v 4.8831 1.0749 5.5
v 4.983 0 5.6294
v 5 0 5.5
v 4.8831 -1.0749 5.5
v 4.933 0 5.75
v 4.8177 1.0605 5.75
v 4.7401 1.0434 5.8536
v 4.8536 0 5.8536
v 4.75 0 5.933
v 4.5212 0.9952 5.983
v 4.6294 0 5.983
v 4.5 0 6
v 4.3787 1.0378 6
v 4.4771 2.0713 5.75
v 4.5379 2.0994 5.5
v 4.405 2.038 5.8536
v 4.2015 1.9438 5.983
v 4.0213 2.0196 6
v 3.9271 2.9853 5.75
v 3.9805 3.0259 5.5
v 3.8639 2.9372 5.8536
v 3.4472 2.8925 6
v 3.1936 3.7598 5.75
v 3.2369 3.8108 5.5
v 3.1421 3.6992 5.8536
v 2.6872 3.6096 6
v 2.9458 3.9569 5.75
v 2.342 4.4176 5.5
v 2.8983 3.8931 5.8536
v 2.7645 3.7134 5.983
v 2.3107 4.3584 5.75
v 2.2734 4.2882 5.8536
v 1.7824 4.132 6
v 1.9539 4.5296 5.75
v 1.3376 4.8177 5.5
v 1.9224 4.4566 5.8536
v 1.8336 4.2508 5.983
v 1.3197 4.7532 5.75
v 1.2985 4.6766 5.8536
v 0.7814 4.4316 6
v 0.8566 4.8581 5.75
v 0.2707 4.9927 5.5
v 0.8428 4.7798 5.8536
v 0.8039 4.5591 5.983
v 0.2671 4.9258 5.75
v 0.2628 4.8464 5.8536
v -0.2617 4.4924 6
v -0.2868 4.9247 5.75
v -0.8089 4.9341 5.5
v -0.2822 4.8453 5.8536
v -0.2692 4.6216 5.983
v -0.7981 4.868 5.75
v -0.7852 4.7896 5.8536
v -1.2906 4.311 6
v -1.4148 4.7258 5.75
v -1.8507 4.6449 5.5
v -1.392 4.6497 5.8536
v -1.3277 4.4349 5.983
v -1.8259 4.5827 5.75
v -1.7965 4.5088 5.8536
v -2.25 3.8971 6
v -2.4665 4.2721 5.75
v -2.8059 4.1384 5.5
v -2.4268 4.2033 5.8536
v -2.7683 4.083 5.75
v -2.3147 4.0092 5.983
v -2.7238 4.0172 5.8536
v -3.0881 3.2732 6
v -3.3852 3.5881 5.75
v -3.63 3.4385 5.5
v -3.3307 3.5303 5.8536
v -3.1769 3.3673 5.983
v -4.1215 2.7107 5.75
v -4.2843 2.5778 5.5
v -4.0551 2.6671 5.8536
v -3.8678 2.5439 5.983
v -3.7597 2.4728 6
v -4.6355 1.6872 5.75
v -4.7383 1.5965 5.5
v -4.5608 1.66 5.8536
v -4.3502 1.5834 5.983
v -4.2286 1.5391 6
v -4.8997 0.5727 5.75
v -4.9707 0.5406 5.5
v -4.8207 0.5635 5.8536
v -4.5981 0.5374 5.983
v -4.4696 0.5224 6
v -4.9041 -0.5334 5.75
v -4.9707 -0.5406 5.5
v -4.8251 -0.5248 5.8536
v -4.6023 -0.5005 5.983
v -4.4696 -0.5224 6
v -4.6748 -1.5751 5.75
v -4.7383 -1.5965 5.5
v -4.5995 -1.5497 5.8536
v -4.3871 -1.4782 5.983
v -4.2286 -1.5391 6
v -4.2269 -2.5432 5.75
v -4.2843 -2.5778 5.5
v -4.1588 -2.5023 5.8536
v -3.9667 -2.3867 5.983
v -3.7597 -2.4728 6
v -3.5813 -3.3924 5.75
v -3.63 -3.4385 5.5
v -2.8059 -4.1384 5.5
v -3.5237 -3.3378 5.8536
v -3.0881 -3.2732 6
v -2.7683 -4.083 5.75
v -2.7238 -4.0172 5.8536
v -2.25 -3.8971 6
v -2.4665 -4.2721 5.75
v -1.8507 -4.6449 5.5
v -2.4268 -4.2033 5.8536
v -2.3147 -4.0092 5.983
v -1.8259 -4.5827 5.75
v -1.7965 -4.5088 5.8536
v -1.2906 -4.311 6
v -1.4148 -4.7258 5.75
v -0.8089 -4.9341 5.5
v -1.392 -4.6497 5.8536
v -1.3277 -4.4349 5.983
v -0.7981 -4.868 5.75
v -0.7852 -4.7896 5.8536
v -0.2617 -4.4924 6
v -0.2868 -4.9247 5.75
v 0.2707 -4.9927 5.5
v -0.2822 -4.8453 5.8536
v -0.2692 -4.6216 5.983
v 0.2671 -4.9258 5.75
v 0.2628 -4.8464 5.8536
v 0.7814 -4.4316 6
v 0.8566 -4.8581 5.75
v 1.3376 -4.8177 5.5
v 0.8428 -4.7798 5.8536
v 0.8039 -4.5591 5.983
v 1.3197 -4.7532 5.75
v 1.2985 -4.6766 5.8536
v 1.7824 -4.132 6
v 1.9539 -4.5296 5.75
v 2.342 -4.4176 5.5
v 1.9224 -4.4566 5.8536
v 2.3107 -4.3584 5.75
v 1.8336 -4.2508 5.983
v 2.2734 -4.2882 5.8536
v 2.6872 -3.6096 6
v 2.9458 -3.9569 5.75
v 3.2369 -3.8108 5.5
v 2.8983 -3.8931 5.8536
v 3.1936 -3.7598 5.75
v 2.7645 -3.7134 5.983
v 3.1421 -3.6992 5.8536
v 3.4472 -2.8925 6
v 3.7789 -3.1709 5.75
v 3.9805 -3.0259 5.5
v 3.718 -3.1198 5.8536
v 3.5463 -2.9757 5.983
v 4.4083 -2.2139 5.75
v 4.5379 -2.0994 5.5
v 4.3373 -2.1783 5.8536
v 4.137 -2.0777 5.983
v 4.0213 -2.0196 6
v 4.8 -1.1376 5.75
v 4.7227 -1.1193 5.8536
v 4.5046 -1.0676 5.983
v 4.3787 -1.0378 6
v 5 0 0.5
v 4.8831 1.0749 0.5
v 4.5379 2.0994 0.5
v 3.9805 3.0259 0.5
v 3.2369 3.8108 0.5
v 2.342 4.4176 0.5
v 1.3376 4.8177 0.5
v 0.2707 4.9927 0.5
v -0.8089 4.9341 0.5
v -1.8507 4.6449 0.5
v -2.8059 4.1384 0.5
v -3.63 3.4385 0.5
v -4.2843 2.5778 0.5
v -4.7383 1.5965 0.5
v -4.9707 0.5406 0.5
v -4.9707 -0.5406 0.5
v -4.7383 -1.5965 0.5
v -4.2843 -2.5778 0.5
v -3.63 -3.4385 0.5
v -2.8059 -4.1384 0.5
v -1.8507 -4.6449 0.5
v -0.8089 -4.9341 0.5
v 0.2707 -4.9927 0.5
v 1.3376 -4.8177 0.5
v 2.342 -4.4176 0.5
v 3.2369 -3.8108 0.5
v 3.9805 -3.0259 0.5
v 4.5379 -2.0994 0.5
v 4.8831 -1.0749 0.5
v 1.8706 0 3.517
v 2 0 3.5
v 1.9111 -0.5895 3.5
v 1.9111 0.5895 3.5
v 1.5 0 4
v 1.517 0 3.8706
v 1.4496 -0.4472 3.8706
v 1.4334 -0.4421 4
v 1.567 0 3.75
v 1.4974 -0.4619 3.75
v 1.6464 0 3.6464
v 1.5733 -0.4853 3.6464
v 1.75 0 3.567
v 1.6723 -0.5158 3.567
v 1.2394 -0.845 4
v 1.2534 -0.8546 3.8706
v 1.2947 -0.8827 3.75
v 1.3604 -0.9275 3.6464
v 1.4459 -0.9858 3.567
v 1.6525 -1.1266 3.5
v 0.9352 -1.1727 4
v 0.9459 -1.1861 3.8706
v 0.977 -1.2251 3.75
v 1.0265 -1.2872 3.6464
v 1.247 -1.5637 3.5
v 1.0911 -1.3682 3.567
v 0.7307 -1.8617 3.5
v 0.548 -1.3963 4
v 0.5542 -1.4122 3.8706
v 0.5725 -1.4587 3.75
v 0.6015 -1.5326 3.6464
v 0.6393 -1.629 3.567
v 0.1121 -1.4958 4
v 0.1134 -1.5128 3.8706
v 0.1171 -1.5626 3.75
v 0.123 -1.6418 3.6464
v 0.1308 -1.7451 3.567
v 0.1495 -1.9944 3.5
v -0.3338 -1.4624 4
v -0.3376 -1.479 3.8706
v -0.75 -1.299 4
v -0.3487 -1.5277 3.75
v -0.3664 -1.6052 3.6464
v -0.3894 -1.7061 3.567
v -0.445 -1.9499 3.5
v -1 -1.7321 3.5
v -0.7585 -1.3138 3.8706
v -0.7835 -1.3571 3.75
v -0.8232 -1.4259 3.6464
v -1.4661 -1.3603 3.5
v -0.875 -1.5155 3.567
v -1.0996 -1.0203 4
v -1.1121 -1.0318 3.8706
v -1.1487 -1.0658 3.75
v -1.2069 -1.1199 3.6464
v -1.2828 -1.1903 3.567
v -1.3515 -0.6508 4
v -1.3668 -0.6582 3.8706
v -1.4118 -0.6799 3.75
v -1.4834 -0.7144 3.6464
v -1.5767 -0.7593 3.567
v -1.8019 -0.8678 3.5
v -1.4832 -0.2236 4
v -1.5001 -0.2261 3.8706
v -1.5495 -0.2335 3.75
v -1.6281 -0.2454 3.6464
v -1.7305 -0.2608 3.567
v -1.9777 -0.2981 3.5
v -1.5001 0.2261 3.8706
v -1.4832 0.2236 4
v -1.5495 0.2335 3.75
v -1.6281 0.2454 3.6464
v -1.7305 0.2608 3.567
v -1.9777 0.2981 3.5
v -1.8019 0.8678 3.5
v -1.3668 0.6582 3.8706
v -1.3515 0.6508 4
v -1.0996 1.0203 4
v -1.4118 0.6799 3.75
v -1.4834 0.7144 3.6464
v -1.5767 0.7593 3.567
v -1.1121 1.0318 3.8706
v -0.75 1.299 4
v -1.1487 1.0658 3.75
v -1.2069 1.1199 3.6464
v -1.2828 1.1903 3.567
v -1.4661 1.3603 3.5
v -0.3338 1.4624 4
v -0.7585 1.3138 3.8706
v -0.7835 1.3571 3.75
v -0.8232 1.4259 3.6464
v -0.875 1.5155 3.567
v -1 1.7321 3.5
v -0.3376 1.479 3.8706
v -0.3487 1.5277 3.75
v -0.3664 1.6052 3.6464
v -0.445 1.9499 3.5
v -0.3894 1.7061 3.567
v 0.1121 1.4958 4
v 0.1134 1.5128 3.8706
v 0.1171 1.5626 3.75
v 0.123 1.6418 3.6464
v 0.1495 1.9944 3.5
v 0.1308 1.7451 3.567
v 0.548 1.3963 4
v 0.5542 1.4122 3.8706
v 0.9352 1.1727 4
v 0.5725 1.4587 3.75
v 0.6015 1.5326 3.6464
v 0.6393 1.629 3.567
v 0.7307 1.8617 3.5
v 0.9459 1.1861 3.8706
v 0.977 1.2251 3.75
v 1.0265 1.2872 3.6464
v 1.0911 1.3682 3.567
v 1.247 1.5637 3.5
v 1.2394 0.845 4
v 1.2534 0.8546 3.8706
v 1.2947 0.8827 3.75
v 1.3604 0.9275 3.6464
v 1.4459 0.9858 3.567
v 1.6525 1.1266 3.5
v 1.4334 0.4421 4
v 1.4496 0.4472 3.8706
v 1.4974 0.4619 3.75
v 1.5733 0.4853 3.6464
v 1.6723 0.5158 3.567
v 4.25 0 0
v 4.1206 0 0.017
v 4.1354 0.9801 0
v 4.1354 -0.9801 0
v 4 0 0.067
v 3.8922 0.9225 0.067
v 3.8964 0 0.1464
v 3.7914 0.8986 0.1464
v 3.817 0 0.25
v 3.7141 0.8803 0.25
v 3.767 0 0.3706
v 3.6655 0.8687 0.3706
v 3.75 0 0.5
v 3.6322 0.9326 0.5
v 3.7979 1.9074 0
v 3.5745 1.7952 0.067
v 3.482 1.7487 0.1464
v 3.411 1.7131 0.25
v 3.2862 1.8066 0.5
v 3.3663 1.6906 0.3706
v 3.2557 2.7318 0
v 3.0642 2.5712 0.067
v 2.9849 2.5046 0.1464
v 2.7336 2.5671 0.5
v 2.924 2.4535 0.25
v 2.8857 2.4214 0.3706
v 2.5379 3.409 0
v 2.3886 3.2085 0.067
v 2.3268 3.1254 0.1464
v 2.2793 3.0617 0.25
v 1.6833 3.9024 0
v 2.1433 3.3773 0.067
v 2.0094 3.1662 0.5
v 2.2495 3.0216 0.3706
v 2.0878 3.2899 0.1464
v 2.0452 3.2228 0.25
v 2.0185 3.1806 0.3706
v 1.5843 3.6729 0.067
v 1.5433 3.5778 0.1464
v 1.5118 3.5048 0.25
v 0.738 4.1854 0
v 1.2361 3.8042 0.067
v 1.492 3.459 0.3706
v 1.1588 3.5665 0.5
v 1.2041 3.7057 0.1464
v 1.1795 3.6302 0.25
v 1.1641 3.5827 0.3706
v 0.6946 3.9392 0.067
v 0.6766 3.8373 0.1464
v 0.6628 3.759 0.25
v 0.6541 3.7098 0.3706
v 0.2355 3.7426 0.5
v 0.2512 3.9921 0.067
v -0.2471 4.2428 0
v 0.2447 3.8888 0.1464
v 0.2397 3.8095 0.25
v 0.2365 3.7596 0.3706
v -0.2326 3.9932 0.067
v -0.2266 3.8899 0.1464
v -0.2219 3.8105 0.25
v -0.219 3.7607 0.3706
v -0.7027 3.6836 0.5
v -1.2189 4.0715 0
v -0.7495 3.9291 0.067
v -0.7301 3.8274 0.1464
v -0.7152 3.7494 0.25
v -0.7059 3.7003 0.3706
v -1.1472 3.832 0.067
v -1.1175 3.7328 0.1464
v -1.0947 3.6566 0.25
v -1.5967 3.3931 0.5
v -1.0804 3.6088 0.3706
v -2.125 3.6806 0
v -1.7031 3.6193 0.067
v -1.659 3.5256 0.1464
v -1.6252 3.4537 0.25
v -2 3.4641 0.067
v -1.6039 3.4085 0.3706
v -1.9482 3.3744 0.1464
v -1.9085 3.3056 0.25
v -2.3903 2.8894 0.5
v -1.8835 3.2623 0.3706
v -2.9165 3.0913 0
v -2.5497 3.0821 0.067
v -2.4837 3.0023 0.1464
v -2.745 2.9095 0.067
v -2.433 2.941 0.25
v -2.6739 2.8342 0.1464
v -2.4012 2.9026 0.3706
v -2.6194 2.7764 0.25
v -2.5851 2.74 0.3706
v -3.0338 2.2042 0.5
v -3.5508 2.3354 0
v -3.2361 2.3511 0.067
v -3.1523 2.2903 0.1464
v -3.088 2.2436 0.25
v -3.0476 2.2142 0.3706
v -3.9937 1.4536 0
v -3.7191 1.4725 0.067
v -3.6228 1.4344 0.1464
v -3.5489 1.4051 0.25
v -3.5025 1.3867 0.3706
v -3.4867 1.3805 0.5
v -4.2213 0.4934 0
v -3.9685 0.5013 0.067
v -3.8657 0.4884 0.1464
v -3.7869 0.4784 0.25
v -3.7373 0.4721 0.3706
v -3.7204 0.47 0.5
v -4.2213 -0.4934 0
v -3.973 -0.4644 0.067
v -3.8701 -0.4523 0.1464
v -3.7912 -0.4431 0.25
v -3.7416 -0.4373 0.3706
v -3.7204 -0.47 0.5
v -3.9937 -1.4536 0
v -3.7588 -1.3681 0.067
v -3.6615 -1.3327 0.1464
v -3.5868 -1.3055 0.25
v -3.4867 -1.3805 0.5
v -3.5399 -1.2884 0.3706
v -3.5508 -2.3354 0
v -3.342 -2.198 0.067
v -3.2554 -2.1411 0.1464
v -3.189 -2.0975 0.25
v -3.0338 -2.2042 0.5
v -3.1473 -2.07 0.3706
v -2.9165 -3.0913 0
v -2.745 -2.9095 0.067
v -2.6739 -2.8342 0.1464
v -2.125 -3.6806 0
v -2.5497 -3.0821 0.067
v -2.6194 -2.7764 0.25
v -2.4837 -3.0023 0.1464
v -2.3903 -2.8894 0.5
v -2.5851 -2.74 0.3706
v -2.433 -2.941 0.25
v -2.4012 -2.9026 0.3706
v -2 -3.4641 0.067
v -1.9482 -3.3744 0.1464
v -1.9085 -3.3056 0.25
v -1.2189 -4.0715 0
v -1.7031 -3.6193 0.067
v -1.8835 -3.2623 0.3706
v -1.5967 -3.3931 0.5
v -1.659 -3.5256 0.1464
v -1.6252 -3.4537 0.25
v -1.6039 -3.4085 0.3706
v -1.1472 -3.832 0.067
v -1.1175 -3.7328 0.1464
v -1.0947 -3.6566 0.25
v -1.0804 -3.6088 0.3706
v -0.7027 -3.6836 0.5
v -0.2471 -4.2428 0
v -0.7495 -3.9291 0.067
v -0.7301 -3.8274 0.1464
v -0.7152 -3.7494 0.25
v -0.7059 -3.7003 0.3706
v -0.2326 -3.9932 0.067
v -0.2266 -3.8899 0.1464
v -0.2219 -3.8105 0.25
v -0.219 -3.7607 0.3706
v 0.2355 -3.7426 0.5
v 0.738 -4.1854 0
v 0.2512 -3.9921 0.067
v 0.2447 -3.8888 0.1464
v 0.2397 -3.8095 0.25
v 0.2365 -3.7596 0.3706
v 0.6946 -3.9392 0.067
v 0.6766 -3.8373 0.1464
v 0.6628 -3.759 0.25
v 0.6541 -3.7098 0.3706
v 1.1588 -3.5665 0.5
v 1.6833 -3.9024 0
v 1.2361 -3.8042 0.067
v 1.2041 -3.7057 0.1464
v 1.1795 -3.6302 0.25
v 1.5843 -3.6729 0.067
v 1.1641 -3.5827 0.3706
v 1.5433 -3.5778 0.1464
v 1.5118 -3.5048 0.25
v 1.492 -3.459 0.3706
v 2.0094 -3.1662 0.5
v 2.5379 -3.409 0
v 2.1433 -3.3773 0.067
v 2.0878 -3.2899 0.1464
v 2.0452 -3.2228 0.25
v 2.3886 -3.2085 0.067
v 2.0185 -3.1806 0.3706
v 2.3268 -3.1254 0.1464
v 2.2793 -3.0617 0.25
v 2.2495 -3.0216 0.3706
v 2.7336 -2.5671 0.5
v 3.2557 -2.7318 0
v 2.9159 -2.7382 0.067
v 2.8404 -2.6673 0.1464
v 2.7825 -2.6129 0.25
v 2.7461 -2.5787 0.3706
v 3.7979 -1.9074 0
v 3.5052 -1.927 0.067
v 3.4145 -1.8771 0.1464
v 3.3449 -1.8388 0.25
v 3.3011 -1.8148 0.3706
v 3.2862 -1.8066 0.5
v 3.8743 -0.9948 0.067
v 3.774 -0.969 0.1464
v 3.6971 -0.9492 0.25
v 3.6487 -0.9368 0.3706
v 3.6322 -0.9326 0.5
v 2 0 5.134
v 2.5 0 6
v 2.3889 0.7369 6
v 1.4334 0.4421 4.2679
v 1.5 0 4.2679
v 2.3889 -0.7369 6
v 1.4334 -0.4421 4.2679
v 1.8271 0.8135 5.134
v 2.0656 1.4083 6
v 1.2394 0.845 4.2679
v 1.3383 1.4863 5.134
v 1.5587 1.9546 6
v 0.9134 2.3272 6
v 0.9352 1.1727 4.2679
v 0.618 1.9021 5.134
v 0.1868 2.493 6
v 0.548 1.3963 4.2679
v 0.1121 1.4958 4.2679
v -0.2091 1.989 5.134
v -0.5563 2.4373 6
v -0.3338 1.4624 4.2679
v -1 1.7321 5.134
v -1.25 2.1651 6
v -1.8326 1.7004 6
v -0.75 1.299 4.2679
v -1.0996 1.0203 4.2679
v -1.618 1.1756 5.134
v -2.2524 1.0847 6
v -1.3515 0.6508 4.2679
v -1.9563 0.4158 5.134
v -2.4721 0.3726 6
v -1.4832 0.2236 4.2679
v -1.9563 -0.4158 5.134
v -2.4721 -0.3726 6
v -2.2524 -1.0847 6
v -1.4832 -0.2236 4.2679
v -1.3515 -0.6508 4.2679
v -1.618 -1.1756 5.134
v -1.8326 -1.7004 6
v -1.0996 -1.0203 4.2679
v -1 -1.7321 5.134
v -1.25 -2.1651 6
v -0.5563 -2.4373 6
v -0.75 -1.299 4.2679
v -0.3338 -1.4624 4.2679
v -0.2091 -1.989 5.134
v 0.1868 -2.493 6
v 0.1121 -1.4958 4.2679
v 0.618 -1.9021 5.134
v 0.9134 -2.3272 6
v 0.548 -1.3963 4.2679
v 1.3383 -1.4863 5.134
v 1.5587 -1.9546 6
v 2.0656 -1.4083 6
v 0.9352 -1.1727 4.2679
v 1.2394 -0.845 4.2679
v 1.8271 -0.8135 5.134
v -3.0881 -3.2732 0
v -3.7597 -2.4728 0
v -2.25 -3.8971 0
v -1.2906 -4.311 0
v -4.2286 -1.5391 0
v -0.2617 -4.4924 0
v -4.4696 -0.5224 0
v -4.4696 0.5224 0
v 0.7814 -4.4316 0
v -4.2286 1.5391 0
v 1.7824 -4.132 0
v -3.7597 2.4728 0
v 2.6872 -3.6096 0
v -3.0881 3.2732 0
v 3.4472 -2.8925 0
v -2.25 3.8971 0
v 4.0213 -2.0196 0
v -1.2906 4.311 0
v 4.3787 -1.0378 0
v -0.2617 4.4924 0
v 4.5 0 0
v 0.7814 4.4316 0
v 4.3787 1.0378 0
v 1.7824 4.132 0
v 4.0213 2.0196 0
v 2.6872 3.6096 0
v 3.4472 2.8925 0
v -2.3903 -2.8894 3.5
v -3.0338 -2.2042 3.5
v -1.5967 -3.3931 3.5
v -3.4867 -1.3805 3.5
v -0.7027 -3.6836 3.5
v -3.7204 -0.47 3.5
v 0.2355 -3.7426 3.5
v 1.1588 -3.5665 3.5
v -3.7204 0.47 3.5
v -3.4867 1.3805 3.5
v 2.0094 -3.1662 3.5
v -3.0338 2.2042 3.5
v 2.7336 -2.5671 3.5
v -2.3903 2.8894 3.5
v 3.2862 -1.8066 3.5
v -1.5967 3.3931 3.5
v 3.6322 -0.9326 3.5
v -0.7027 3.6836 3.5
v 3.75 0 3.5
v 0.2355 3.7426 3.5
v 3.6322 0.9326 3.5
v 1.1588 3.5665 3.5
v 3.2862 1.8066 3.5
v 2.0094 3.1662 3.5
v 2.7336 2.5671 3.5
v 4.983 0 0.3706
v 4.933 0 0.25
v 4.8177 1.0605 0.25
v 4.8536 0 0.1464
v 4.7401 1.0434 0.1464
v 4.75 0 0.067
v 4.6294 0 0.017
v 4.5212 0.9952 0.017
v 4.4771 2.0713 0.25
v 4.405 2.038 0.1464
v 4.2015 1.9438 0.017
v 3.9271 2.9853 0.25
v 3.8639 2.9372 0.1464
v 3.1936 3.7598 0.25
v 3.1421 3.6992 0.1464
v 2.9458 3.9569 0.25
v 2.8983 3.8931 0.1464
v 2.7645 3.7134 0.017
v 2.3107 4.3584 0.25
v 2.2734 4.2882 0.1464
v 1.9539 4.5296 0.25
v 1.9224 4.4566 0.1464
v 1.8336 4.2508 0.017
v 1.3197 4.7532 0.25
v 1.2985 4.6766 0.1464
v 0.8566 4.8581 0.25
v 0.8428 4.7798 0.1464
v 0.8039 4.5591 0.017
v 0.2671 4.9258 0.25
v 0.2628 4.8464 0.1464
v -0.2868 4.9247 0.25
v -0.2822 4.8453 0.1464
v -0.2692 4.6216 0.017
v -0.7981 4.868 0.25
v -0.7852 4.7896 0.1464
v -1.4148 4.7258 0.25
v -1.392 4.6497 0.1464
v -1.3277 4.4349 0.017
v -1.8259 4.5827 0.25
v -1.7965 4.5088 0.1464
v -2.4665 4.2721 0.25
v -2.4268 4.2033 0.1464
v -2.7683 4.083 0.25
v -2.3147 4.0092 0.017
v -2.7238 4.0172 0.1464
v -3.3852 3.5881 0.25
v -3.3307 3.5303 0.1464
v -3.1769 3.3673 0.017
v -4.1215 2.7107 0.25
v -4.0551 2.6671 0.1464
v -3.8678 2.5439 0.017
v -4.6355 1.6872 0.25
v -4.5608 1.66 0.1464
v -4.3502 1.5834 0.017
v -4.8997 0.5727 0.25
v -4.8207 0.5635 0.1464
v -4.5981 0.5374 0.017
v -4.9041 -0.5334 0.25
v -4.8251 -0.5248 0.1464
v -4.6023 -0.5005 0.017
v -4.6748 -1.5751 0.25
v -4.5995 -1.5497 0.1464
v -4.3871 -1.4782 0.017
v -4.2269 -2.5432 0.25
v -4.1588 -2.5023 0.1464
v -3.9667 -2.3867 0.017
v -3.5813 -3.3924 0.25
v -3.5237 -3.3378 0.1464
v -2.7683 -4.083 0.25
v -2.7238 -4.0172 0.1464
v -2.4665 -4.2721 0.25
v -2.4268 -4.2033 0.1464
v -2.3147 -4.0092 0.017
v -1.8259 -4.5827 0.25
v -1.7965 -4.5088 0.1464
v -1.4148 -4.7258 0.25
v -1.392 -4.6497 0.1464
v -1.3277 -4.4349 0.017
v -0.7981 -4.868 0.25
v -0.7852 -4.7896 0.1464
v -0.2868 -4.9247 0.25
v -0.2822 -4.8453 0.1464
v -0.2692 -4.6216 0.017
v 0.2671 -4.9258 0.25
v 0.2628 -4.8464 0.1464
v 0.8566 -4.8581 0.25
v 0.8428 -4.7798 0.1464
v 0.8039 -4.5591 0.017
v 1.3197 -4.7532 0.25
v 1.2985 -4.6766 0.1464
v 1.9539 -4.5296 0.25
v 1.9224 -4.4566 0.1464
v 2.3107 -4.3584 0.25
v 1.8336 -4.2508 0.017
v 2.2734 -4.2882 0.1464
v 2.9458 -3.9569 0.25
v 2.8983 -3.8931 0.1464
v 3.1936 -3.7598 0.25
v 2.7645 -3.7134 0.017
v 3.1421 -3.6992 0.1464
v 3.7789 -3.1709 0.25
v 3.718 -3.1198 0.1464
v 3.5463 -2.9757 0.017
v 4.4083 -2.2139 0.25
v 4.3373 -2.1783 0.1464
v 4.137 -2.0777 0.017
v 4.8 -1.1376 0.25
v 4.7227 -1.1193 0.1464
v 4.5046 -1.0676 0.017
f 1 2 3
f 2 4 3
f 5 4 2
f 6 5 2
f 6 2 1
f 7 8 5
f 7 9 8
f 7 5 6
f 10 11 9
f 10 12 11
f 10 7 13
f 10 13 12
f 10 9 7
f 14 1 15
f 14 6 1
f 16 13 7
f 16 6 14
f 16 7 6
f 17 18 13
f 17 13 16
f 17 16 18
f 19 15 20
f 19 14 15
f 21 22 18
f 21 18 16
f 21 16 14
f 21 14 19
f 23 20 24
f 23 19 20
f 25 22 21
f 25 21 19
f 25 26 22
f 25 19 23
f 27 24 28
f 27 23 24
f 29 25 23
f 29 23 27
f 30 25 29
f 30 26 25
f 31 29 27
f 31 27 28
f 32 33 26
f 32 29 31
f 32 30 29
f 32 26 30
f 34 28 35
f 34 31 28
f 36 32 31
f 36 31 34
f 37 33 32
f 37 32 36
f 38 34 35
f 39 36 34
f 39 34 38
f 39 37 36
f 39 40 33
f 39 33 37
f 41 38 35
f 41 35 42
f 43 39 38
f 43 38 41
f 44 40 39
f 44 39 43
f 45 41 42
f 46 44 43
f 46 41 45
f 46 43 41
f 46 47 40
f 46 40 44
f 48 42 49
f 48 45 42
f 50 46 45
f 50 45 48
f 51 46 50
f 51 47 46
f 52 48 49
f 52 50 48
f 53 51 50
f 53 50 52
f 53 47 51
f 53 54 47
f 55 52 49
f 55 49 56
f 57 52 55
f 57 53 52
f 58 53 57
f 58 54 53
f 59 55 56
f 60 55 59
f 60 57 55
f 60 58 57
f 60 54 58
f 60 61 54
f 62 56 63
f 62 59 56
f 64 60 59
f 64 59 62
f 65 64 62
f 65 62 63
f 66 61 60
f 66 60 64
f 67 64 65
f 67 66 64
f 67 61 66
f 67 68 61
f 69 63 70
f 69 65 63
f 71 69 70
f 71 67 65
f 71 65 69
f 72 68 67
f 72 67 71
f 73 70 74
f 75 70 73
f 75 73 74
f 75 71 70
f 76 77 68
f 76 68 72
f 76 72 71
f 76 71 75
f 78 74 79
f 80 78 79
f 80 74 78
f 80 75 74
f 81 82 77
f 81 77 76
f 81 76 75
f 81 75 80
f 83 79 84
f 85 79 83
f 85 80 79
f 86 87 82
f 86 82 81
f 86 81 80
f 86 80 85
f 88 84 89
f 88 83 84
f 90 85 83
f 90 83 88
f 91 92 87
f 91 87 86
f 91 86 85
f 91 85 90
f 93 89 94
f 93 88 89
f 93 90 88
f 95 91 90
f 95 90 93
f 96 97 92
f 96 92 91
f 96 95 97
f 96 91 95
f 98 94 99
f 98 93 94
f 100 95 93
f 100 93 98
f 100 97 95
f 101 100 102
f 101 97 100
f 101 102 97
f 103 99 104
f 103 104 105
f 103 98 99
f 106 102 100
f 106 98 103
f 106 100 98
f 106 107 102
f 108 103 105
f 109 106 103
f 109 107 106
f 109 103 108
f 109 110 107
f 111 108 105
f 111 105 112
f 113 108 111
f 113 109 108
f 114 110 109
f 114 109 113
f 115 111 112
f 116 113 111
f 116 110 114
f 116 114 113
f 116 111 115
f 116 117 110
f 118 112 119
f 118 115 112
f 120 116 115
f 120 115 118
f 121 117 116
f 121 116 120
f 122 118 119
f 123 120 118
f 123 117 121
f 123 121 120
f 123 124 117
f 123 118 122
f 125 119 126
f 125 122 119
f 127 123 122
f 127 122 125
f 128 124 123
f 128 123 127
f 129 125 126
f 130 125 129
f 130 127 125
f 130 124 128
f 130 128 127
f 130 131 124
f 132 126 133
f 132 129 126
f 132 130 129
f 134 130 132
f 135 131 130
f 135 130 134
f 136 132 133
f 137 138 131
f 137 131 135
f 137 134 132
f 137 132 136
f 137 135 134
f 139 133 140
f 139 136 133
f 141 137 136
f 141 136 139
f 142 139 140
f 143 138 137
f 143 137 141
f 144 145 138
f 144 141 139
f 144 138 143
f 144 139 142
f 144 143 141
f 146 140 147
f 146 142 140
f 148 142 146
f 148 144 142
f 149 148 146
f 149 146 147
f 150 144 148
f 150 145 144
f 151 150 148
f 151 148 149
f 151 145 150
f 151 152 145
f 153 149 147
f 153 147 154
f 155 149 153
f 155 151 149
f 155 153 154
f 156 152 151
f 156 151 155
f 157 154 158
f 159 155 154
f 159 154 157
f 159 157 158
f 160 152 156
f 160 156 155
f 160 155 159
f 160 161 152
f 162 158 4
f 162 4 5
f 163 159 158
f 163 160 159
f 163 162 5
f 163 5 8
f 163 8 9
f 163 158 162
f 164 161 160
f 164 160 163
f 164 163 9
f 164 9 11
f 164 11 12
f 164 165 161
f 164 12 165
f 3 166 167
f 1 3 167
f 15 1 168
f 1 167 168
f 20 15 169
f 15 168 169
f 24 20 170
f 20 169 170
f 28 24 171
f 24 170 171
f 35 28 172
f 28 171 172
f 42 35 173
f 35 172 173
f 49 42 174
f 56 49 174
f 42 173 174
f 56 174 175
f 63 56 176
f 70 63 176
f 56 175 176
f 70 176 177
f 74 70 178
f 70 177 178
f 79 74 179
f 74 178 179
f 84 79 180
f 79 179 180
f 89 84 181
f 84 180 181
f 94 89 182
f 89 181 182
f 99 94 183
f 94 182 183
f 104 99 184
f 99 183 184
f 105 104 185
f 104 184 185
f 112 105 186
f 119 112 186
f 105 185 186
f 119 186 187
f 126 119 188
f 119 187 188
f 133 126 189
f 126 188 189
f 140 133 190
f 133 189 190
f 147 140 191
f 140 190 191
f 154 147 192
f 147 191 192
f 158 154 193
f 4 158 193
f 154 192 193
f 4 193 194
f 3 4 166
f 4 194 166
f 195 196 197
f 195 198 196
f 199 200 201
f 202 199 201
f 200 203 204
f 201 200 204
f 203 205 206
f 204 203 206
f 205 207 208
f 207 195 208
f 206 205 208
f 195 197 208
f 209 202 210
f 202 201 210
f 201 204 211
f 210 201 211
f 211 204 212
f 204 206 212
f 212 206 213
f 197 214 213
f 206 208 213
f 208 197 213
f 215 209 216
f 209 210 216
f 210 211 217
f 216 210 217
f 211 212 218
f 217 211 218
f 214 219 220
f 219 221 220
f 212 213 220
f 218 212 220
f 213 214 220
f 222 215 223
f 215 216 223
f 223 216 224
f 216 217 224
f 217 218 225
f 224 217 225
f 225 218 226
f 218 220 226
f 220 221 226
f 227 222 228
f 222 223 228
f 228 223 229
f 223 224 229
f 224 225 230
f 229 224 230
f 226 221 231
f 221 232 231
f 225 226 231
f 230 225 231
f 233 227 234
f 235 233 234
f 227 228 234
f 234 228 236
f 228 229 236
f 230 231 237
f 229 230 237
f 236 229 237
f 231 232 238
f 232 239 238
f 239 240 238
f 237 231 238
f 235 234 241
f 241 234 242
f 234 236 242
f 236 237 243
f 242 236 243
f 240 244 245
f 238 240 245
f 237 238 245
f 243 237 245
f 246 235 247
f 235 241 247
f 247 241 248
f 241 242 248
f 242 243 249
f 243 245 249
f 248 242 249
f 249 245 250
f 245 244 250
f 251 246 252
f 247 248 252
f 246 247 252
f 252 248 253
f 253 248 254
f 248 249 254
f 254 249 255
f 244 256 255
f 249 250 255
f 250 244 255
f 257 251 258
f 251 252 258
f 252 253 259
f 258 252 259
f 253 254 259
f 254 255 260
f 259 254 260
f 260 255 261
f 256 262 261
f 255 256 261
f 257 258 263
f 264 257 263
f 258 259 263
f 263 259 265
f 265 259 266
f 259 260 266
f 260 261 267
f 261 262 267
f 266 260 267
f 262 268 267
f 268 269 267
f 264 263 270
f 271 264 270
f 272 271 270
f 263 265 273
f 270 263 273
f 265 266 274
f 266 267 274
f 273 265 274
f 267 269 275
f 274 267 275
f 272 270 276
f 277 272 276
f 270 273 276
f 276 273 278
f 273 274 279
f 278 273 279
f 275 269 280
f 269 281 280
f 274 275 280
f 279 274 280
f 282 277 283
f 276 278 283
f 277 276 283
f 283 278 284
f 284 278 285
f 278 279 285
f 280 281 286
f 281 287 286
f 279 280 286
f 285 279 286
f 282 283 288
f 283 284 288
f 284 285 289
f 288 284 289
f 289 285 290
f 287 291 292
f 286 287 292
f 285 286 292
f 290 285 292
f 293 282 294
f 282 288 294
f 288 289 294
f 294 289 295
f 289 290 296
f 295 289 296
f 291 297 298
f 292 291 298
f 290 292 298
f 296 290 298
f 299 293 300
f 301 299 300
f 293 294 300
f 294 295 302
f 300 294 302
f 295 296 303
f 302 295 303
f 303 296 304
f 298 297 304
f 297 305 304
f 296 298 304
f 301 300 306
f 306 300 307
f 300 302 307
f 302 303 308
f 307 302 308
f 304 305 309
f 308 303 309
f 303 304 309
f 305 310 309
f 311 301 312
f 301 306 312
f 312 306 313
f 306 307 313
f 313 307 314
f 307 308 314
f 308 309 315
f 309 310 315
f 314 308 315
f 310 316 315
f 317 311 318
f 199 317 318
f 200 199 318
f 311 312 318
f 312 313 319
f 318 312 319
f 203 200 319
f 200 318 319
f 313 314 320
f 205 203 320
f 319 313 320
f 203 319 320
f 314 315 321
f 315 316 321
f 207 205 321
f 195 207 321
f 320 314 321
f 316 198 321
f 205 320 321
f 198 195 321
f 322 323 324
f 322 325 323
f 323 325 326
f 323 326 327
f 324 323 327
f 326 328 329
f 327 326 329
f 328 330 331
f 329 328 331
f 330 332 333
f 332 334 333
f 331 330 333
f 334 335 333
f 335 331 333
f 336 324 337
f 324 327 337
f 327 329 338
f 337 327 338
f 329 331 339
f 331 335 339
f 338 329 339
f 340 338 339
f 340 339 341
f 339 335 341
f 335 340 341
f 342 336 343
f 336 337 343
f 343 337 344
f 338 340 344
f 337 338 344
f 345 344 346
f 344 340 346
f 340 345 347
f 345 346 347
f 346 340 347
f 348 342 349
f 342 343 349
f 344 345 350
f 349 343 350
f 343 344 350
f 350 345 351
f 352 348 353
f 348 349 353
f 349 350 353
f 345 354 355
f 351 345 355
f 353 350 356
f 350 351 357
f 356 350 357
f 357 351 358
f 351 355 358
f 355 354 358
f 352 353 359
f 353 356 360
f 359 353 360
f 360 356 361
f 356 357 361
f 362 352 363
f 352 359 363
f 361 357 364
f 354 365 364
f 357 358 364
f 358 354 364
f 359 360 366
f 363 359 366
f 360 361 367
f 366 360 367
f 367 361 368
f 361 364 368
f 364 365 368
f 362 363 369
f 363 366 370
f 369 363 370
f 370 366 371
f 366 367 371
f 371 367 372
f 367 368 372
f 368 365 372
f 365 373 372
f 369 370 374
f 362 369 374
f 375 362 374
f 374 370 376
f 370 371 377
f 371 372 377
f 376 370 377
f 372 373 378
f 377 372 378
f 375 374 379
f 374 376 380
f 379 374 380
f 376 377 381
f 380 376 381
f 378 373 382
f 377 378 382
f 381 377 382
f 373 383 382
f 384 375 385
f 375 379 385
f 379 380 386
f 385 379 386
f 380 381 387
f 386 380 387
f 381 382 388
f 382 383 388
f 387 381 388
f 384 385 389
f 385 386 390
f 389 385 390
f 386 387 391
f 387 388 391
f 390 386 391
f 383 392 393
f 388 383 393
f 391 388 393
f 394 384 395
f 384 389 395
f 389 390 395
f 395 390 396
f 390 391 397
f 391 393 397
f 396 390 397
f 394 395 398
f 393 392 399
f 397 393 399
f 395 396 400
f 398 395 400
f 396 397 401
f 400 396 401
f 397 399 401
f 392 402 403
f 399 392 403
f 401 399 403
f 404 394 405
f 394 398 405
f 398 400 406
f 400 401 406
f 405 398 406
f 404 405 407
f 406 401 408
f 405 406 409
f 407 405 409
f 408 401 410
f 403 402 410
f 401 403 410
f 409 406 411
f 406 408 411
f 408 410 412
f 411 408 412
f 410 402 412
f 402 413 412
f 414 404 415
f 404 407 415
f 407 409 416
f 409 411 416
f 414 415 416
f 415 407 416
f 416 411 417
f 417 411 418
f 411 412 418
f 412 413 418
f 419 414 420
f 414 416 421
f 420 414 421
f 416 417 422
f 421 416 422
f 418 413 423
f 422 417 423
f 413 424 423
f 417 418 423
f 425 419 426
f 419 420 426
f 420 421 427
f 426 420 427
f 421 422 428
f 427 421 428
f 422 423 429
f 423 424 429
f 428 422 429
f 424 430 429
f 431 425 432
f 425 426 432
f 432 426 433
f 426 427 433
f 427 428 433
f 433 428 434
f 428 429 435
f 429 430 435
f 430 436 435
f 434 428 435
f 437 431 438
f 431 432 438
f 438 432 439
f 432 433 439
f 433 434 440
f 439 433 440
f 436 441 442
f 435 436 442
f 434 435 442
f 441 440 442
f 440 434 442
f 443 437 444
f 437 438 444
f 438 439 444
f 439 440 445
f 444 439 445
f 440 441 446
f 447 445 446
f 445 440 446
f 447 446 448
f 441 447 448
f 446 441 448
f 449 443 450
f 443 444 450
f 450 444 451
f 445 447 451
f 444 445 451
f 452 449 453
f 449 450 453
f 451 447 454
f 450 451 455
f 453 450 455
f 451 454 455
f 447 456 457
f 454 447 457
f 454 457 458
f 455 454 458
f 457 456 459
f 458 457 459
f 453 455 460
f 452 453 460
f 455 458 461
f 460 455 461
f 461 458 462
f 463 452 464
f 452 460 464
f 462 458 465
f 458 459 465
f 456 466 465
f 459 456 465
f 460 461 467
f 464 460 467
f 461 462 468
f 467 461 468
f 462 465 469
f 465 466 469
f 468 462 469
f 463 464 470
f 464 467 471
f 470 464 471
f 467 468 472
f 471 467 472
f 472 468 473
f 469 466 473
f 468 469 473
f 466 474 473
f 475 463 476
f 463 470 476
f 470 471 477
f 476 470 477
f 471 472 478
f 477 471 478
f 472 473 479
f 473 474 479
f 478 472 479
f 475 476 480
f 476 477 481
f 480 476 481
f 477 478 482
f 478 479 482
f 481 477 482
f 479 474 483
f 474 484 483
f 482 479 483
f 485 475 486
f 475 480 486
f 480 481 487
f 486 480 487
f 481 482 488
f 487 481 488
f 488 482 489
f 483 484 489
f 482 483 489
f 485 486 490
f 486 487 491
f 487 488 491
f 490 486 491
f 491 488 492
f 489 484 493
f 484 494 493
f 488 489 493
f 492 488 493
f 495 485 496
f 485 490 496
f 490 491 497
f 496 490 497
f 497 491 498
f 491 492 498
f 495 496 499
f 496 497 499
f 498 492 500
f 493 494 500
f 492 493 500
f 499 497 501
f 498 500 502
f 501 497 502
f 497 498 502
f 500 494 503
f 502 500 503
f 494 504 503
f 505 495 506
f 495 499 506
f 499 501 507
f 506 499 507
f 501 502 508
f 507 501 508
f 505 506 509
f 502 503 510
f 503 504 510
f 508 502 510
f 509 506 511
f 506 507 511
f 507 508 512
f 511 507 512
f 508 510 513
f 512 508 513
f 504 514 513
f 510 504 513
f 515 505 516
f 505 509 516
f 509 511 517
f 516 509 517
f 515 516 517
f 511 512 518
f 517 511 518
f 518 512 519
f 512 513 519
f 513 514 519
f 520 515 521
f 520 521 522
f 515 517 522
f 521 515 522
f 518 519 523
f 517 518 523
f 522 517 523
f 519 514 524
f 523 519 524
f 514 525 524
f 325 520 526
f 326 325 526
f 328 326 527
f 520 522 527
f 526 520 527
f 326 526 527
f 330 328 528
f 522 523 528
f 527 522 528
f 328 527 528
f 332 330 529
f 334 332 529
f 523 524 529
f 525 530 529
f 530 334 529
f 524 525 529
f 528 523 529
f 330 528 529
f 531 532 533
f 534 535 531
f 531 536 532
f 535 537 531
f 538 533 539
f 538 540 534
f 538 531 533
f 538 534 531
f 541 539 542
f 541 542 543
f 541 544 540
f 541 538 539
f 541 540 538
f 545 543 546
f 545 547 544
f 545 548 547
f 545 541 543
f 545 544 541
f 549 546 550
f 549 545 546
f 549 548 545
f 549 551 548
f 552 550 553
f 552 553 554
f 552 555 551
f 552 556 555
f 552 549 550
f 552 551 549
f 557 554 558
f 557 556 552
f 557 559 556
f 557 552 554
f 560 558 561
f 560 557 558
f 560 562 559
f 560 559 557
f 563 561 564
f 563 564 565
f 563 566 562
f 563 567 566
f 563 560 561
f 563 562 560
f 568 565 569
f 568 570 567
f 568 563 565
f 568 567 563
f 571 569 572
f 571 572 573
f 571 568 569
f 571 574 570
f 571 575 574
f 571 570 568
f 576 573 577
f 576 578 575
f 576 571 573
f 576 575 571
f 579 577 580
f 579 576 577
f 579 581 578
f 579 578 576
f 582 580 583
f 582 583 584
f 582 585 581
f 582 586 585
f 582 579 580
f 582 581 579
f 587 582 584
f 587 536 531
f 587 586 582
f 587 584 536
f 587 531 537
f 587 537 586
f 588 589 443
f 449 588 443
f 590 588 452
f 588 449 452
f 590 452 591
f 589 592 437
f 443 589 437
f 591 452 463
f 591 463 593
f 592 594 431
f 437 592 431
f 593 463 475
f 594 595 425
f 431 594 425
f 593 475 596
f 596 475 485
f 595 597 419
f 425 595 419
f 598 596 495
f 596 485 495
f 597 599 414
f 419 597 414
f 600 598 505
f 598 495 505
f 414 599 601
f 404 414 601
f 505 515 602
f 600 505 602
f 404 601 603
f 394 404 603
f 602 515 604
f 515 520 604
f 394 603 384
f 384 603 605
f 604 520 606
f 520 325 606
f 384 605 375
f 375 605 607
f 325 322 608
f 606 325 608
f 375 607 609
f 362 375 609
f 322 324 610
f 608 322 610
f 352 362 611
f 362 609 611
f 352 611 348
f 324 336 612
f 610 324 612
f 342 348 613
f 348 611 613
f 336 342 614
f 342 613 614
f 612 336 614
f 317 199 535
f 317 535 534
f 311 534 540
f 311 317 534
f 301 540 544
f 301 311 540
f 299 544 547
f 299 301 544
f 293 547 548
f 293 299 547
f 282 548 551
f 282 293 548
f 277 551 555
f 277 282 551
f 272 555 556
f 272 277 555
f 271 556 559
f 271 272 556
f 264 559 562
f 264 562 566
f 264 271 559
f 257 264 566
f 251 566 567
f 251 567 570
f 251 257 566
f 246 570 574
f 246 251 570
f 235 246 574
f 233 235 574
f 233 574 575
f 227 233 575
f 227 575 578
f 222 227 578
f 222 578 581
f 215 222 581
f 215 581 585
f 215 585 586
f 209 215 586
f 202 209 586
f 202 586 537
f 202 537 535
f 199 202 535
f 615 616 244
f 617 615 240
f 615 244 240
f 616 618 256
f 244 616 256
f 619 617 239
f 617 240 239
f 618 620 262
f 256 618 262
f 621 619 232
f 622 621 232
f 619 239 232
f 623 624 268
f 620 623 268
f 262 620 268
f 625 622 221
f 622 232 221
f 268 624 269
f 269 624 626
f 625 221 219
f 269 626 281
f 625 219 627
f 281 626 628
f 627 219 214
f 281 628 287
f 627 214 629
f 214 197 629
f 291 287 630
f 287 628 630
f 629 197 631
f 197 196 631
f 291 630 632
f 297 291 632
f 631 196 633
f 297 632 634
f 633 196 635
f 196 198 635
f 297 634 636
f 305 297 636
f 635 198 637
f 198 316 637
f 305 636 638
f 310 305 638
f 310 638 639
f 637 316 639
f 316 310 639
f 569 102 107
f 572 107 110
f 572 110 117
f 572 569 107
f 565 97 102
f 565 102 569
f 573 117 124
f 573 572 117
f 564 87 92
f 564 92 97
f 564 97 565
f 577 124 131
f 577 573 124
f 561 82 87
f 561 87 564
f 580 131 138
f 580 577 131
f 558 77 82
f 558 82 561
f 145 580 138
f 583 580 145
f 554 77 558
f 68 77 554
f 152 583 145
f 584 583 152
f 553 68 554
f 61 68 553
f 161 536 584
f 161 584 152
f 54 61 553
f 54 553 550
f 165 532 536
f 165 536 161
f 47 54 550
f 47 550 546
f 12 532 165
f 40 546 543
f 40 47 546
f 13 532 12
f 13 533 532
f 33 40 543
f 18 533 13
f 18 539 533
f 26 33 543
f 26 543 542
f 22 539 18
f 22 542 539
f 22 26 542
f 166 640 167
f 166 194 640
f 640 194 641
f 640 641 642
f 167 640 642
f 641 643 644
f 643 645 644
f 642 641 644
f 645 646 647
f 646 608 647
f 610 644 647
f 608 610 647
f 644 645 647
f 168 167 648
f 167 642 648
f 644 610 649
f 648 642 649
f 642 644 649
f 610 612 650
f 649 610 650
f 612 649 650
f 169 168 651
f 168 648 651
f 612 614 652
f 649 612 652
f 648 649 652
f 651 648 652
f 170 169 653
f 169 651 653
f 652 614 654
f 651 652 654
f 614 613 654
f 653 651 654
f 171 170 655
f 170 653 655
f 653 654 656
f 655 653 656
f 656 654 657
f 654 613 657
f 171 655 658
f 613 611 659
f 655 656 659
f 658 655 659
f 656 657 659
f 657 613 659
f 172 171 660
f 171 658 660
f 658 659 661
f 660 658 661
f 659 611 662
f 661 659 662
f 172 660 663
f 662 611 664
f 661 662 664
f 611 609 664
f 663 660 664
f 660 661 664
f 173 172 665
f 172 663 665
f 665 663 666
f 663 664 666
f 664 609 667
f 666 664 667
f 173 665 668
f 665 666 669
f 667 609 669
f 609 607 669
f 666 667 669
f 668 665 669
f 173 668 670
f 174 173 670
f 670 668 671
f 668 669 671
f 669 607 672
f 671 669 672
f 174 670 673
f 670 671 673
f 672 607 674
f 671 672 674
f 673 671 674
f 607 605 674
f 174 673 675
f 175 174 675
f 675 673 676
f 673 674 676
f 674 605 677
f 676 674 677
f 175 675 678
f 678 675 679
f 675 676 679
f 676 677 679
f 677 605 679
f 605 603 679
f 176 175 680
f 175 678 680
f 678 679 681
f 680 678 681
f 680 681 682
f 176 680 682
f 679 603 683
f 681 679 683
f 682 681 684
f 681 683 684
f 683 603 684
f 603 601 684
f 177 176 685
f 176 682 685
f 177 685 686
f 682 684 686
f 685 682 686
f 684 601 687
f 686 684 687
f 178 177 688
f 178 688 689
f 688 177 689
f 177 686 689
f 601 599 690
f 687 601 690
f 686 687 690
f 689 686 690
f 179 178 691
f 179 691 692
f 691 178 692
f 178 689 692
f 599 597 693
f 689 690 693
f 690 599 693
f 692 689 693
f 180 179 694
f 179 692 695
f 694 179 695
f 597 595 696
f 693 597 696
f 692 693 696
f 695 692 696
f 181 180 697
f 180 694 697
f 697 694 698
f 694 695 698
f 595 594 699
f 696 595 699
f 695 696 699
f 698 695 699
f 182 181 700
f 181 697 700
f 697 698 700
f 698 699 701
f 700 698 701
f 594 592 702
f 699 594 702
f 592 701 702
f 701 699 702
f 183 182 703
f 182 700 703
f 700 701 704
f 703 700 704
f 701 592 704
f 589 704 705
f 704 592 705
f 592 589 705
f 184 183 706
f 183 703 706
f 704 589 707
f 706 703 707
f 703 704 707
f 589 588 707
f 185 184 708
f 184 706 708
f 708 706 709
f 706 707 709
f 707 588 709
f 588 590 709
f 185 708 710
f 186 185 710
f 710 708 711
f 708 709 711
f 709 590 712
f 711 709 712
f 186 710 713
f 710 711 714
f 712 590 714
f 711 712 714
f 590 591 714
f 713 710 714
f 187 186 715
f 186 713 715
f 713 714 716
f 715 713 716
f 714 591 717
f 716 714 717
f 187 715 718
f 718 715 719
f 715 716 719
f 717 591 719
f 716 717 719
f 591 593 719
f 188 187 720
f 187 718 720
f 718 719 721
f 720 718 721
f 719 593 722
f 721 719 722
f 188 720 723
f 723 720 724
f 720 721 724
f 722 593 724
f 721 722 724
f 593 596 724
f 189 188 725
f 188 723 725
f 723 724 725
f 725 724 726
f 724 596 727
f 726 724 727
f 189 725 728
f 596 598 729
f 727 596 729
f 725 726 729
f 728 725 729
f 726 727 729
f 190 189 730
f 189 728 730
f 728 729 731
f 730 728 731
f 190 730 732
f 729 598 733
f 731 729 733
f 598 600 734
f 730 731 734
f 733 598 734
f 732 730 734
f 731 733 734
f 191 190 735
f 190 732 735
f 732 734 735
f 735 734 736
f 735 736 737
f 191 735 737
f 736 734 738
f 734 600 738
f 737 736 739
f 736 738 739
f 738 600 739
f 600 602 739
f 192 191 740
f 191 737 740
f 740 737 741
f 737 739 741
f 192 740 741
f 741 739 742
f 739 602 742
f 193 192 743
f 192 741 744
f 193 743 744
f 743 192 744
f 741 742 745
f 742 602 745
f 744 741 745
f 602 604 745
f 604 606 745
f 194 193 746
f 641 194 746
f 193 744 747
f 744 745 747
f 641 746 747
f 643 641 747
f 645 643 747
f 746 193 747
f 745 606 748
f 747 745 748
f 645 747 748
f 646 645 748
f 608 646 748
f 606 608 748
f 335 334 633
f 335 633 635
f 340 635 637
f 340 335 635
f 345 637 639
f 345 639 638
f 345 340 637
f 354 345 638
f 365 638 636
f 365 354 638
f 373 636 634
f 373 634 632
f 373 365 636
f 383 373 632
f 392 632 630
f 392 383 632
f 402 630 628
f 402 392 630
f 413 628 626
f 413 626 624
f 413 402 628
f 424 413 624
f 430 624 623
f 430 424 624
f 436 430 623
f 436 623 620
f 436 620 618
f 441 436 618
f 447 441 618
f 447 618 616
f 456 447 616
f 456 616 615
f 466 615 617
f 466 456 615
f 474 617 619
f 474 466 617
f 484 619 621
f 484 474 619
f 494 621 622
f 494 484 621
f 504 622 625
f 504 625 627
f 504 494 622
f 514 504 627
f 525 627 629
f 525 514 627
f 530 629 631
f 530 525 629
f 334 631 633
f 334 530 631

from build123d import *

# Parameters (mm, degrees)
SKETCH1_R           = 5
SKETCH1_R_2         = 1.5
BOSS_EXTRUDE1_DEPTH = 6
SKETCH2_R           = 3.75
CUT_EXTRUDE1_DEPTH  = 3.5
FILLET1_R           = 0.5
CHAMFER1_SIZE       = 1
CHAMFER1_SIZE2      = 1.732050808


with BuildPart() as part:
    # Sketch1 → Boss-Extrude1 (new body)
    with BuildSketch(Plane.XY):
        Circle(SKETCH1_R)
        Circle(SKETCH1_R_2, mode=Mode.SUBTRACT)
    extrude(amount=BOSS_EXTRUDE1_DEPTH)

    # Sketch2 → Cut-Extrude1 (cut)
    with BuildSketch(Plane.XY):
        Circle(SKETCH2_R)
    extrude(amount=CUT_EXTRUDE1_DEPTH, mode=Mode.SUBTRACT)

    # Fillet1
    fillet1_edges = [part.edges().sort_by_distance(p)[0] for p in [
        (-1.5, 0, 3.5),
        (-3.75, 0, 0),
        (-5, 0, 0),
        (-5, 0, 6),
    ]]
    fillet(fillet1_edges, radius=FILLET1_R)

    # Chamfer1
    chamfer1_edges = [part.edges().sort_by_distance(p)[0] for p in [
        (-1.5, 0, 6),
    ]]
    chamfer1_side = [part.faces().sort_by_distance(p)[0] for p in [
        (-4.372720779, 0, 6),
    ]]
    chamfer(chamfer1_edges, length=CHAMFER1_SIZE, length2=CHAMFER1_SIZE2, reference=chamfer1_side[0])


solid = part.part
